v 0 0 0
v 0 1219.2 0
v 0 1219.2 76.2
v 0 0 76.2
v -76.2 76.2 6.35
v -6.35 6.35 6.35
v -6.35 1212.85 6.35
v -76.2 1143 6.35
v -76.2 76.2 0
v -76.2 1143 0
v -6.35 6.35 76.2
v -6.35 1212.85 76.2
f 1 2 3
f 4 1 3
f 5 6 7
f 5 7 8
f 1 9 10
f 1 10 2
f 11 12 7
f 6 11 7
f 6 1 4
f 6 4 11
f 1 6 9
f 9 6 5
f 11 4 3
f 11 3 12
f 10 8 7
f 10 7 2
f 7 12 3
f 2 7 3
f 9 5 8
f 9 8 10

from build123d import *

# Parameters (mm, degrees)
F1_DEPTH = 1219.2
F3_DEPTH = 76.2


with BuildPart() as f1:
    # F0 (on Front) → F1 (new body)
    with BuildSketch(Plane.XZ):
        Polygon((0, 0), (0, 76.2), (-6.35, 76.2), (-6.35, 6.35), (-76.2, 6.35), (-76.2, 0), align=None)
    extrude(amount=-F1_DEPTH)

    # F2 (on face) → F3 (cut)
    with BuildSketch(Plane.XY.offset(76.2)):
        Polygon((0, 1219.2), (-76.2, 1219.2), (-76.2, 1143), align=None)
        Polygon((-76.2, 0), (0, 0), (-76.2, 76.2), align=None)
    extrude(amount=-F3_DEPTH, mode=Mode.SUBTRACT)


solid = f1.part
